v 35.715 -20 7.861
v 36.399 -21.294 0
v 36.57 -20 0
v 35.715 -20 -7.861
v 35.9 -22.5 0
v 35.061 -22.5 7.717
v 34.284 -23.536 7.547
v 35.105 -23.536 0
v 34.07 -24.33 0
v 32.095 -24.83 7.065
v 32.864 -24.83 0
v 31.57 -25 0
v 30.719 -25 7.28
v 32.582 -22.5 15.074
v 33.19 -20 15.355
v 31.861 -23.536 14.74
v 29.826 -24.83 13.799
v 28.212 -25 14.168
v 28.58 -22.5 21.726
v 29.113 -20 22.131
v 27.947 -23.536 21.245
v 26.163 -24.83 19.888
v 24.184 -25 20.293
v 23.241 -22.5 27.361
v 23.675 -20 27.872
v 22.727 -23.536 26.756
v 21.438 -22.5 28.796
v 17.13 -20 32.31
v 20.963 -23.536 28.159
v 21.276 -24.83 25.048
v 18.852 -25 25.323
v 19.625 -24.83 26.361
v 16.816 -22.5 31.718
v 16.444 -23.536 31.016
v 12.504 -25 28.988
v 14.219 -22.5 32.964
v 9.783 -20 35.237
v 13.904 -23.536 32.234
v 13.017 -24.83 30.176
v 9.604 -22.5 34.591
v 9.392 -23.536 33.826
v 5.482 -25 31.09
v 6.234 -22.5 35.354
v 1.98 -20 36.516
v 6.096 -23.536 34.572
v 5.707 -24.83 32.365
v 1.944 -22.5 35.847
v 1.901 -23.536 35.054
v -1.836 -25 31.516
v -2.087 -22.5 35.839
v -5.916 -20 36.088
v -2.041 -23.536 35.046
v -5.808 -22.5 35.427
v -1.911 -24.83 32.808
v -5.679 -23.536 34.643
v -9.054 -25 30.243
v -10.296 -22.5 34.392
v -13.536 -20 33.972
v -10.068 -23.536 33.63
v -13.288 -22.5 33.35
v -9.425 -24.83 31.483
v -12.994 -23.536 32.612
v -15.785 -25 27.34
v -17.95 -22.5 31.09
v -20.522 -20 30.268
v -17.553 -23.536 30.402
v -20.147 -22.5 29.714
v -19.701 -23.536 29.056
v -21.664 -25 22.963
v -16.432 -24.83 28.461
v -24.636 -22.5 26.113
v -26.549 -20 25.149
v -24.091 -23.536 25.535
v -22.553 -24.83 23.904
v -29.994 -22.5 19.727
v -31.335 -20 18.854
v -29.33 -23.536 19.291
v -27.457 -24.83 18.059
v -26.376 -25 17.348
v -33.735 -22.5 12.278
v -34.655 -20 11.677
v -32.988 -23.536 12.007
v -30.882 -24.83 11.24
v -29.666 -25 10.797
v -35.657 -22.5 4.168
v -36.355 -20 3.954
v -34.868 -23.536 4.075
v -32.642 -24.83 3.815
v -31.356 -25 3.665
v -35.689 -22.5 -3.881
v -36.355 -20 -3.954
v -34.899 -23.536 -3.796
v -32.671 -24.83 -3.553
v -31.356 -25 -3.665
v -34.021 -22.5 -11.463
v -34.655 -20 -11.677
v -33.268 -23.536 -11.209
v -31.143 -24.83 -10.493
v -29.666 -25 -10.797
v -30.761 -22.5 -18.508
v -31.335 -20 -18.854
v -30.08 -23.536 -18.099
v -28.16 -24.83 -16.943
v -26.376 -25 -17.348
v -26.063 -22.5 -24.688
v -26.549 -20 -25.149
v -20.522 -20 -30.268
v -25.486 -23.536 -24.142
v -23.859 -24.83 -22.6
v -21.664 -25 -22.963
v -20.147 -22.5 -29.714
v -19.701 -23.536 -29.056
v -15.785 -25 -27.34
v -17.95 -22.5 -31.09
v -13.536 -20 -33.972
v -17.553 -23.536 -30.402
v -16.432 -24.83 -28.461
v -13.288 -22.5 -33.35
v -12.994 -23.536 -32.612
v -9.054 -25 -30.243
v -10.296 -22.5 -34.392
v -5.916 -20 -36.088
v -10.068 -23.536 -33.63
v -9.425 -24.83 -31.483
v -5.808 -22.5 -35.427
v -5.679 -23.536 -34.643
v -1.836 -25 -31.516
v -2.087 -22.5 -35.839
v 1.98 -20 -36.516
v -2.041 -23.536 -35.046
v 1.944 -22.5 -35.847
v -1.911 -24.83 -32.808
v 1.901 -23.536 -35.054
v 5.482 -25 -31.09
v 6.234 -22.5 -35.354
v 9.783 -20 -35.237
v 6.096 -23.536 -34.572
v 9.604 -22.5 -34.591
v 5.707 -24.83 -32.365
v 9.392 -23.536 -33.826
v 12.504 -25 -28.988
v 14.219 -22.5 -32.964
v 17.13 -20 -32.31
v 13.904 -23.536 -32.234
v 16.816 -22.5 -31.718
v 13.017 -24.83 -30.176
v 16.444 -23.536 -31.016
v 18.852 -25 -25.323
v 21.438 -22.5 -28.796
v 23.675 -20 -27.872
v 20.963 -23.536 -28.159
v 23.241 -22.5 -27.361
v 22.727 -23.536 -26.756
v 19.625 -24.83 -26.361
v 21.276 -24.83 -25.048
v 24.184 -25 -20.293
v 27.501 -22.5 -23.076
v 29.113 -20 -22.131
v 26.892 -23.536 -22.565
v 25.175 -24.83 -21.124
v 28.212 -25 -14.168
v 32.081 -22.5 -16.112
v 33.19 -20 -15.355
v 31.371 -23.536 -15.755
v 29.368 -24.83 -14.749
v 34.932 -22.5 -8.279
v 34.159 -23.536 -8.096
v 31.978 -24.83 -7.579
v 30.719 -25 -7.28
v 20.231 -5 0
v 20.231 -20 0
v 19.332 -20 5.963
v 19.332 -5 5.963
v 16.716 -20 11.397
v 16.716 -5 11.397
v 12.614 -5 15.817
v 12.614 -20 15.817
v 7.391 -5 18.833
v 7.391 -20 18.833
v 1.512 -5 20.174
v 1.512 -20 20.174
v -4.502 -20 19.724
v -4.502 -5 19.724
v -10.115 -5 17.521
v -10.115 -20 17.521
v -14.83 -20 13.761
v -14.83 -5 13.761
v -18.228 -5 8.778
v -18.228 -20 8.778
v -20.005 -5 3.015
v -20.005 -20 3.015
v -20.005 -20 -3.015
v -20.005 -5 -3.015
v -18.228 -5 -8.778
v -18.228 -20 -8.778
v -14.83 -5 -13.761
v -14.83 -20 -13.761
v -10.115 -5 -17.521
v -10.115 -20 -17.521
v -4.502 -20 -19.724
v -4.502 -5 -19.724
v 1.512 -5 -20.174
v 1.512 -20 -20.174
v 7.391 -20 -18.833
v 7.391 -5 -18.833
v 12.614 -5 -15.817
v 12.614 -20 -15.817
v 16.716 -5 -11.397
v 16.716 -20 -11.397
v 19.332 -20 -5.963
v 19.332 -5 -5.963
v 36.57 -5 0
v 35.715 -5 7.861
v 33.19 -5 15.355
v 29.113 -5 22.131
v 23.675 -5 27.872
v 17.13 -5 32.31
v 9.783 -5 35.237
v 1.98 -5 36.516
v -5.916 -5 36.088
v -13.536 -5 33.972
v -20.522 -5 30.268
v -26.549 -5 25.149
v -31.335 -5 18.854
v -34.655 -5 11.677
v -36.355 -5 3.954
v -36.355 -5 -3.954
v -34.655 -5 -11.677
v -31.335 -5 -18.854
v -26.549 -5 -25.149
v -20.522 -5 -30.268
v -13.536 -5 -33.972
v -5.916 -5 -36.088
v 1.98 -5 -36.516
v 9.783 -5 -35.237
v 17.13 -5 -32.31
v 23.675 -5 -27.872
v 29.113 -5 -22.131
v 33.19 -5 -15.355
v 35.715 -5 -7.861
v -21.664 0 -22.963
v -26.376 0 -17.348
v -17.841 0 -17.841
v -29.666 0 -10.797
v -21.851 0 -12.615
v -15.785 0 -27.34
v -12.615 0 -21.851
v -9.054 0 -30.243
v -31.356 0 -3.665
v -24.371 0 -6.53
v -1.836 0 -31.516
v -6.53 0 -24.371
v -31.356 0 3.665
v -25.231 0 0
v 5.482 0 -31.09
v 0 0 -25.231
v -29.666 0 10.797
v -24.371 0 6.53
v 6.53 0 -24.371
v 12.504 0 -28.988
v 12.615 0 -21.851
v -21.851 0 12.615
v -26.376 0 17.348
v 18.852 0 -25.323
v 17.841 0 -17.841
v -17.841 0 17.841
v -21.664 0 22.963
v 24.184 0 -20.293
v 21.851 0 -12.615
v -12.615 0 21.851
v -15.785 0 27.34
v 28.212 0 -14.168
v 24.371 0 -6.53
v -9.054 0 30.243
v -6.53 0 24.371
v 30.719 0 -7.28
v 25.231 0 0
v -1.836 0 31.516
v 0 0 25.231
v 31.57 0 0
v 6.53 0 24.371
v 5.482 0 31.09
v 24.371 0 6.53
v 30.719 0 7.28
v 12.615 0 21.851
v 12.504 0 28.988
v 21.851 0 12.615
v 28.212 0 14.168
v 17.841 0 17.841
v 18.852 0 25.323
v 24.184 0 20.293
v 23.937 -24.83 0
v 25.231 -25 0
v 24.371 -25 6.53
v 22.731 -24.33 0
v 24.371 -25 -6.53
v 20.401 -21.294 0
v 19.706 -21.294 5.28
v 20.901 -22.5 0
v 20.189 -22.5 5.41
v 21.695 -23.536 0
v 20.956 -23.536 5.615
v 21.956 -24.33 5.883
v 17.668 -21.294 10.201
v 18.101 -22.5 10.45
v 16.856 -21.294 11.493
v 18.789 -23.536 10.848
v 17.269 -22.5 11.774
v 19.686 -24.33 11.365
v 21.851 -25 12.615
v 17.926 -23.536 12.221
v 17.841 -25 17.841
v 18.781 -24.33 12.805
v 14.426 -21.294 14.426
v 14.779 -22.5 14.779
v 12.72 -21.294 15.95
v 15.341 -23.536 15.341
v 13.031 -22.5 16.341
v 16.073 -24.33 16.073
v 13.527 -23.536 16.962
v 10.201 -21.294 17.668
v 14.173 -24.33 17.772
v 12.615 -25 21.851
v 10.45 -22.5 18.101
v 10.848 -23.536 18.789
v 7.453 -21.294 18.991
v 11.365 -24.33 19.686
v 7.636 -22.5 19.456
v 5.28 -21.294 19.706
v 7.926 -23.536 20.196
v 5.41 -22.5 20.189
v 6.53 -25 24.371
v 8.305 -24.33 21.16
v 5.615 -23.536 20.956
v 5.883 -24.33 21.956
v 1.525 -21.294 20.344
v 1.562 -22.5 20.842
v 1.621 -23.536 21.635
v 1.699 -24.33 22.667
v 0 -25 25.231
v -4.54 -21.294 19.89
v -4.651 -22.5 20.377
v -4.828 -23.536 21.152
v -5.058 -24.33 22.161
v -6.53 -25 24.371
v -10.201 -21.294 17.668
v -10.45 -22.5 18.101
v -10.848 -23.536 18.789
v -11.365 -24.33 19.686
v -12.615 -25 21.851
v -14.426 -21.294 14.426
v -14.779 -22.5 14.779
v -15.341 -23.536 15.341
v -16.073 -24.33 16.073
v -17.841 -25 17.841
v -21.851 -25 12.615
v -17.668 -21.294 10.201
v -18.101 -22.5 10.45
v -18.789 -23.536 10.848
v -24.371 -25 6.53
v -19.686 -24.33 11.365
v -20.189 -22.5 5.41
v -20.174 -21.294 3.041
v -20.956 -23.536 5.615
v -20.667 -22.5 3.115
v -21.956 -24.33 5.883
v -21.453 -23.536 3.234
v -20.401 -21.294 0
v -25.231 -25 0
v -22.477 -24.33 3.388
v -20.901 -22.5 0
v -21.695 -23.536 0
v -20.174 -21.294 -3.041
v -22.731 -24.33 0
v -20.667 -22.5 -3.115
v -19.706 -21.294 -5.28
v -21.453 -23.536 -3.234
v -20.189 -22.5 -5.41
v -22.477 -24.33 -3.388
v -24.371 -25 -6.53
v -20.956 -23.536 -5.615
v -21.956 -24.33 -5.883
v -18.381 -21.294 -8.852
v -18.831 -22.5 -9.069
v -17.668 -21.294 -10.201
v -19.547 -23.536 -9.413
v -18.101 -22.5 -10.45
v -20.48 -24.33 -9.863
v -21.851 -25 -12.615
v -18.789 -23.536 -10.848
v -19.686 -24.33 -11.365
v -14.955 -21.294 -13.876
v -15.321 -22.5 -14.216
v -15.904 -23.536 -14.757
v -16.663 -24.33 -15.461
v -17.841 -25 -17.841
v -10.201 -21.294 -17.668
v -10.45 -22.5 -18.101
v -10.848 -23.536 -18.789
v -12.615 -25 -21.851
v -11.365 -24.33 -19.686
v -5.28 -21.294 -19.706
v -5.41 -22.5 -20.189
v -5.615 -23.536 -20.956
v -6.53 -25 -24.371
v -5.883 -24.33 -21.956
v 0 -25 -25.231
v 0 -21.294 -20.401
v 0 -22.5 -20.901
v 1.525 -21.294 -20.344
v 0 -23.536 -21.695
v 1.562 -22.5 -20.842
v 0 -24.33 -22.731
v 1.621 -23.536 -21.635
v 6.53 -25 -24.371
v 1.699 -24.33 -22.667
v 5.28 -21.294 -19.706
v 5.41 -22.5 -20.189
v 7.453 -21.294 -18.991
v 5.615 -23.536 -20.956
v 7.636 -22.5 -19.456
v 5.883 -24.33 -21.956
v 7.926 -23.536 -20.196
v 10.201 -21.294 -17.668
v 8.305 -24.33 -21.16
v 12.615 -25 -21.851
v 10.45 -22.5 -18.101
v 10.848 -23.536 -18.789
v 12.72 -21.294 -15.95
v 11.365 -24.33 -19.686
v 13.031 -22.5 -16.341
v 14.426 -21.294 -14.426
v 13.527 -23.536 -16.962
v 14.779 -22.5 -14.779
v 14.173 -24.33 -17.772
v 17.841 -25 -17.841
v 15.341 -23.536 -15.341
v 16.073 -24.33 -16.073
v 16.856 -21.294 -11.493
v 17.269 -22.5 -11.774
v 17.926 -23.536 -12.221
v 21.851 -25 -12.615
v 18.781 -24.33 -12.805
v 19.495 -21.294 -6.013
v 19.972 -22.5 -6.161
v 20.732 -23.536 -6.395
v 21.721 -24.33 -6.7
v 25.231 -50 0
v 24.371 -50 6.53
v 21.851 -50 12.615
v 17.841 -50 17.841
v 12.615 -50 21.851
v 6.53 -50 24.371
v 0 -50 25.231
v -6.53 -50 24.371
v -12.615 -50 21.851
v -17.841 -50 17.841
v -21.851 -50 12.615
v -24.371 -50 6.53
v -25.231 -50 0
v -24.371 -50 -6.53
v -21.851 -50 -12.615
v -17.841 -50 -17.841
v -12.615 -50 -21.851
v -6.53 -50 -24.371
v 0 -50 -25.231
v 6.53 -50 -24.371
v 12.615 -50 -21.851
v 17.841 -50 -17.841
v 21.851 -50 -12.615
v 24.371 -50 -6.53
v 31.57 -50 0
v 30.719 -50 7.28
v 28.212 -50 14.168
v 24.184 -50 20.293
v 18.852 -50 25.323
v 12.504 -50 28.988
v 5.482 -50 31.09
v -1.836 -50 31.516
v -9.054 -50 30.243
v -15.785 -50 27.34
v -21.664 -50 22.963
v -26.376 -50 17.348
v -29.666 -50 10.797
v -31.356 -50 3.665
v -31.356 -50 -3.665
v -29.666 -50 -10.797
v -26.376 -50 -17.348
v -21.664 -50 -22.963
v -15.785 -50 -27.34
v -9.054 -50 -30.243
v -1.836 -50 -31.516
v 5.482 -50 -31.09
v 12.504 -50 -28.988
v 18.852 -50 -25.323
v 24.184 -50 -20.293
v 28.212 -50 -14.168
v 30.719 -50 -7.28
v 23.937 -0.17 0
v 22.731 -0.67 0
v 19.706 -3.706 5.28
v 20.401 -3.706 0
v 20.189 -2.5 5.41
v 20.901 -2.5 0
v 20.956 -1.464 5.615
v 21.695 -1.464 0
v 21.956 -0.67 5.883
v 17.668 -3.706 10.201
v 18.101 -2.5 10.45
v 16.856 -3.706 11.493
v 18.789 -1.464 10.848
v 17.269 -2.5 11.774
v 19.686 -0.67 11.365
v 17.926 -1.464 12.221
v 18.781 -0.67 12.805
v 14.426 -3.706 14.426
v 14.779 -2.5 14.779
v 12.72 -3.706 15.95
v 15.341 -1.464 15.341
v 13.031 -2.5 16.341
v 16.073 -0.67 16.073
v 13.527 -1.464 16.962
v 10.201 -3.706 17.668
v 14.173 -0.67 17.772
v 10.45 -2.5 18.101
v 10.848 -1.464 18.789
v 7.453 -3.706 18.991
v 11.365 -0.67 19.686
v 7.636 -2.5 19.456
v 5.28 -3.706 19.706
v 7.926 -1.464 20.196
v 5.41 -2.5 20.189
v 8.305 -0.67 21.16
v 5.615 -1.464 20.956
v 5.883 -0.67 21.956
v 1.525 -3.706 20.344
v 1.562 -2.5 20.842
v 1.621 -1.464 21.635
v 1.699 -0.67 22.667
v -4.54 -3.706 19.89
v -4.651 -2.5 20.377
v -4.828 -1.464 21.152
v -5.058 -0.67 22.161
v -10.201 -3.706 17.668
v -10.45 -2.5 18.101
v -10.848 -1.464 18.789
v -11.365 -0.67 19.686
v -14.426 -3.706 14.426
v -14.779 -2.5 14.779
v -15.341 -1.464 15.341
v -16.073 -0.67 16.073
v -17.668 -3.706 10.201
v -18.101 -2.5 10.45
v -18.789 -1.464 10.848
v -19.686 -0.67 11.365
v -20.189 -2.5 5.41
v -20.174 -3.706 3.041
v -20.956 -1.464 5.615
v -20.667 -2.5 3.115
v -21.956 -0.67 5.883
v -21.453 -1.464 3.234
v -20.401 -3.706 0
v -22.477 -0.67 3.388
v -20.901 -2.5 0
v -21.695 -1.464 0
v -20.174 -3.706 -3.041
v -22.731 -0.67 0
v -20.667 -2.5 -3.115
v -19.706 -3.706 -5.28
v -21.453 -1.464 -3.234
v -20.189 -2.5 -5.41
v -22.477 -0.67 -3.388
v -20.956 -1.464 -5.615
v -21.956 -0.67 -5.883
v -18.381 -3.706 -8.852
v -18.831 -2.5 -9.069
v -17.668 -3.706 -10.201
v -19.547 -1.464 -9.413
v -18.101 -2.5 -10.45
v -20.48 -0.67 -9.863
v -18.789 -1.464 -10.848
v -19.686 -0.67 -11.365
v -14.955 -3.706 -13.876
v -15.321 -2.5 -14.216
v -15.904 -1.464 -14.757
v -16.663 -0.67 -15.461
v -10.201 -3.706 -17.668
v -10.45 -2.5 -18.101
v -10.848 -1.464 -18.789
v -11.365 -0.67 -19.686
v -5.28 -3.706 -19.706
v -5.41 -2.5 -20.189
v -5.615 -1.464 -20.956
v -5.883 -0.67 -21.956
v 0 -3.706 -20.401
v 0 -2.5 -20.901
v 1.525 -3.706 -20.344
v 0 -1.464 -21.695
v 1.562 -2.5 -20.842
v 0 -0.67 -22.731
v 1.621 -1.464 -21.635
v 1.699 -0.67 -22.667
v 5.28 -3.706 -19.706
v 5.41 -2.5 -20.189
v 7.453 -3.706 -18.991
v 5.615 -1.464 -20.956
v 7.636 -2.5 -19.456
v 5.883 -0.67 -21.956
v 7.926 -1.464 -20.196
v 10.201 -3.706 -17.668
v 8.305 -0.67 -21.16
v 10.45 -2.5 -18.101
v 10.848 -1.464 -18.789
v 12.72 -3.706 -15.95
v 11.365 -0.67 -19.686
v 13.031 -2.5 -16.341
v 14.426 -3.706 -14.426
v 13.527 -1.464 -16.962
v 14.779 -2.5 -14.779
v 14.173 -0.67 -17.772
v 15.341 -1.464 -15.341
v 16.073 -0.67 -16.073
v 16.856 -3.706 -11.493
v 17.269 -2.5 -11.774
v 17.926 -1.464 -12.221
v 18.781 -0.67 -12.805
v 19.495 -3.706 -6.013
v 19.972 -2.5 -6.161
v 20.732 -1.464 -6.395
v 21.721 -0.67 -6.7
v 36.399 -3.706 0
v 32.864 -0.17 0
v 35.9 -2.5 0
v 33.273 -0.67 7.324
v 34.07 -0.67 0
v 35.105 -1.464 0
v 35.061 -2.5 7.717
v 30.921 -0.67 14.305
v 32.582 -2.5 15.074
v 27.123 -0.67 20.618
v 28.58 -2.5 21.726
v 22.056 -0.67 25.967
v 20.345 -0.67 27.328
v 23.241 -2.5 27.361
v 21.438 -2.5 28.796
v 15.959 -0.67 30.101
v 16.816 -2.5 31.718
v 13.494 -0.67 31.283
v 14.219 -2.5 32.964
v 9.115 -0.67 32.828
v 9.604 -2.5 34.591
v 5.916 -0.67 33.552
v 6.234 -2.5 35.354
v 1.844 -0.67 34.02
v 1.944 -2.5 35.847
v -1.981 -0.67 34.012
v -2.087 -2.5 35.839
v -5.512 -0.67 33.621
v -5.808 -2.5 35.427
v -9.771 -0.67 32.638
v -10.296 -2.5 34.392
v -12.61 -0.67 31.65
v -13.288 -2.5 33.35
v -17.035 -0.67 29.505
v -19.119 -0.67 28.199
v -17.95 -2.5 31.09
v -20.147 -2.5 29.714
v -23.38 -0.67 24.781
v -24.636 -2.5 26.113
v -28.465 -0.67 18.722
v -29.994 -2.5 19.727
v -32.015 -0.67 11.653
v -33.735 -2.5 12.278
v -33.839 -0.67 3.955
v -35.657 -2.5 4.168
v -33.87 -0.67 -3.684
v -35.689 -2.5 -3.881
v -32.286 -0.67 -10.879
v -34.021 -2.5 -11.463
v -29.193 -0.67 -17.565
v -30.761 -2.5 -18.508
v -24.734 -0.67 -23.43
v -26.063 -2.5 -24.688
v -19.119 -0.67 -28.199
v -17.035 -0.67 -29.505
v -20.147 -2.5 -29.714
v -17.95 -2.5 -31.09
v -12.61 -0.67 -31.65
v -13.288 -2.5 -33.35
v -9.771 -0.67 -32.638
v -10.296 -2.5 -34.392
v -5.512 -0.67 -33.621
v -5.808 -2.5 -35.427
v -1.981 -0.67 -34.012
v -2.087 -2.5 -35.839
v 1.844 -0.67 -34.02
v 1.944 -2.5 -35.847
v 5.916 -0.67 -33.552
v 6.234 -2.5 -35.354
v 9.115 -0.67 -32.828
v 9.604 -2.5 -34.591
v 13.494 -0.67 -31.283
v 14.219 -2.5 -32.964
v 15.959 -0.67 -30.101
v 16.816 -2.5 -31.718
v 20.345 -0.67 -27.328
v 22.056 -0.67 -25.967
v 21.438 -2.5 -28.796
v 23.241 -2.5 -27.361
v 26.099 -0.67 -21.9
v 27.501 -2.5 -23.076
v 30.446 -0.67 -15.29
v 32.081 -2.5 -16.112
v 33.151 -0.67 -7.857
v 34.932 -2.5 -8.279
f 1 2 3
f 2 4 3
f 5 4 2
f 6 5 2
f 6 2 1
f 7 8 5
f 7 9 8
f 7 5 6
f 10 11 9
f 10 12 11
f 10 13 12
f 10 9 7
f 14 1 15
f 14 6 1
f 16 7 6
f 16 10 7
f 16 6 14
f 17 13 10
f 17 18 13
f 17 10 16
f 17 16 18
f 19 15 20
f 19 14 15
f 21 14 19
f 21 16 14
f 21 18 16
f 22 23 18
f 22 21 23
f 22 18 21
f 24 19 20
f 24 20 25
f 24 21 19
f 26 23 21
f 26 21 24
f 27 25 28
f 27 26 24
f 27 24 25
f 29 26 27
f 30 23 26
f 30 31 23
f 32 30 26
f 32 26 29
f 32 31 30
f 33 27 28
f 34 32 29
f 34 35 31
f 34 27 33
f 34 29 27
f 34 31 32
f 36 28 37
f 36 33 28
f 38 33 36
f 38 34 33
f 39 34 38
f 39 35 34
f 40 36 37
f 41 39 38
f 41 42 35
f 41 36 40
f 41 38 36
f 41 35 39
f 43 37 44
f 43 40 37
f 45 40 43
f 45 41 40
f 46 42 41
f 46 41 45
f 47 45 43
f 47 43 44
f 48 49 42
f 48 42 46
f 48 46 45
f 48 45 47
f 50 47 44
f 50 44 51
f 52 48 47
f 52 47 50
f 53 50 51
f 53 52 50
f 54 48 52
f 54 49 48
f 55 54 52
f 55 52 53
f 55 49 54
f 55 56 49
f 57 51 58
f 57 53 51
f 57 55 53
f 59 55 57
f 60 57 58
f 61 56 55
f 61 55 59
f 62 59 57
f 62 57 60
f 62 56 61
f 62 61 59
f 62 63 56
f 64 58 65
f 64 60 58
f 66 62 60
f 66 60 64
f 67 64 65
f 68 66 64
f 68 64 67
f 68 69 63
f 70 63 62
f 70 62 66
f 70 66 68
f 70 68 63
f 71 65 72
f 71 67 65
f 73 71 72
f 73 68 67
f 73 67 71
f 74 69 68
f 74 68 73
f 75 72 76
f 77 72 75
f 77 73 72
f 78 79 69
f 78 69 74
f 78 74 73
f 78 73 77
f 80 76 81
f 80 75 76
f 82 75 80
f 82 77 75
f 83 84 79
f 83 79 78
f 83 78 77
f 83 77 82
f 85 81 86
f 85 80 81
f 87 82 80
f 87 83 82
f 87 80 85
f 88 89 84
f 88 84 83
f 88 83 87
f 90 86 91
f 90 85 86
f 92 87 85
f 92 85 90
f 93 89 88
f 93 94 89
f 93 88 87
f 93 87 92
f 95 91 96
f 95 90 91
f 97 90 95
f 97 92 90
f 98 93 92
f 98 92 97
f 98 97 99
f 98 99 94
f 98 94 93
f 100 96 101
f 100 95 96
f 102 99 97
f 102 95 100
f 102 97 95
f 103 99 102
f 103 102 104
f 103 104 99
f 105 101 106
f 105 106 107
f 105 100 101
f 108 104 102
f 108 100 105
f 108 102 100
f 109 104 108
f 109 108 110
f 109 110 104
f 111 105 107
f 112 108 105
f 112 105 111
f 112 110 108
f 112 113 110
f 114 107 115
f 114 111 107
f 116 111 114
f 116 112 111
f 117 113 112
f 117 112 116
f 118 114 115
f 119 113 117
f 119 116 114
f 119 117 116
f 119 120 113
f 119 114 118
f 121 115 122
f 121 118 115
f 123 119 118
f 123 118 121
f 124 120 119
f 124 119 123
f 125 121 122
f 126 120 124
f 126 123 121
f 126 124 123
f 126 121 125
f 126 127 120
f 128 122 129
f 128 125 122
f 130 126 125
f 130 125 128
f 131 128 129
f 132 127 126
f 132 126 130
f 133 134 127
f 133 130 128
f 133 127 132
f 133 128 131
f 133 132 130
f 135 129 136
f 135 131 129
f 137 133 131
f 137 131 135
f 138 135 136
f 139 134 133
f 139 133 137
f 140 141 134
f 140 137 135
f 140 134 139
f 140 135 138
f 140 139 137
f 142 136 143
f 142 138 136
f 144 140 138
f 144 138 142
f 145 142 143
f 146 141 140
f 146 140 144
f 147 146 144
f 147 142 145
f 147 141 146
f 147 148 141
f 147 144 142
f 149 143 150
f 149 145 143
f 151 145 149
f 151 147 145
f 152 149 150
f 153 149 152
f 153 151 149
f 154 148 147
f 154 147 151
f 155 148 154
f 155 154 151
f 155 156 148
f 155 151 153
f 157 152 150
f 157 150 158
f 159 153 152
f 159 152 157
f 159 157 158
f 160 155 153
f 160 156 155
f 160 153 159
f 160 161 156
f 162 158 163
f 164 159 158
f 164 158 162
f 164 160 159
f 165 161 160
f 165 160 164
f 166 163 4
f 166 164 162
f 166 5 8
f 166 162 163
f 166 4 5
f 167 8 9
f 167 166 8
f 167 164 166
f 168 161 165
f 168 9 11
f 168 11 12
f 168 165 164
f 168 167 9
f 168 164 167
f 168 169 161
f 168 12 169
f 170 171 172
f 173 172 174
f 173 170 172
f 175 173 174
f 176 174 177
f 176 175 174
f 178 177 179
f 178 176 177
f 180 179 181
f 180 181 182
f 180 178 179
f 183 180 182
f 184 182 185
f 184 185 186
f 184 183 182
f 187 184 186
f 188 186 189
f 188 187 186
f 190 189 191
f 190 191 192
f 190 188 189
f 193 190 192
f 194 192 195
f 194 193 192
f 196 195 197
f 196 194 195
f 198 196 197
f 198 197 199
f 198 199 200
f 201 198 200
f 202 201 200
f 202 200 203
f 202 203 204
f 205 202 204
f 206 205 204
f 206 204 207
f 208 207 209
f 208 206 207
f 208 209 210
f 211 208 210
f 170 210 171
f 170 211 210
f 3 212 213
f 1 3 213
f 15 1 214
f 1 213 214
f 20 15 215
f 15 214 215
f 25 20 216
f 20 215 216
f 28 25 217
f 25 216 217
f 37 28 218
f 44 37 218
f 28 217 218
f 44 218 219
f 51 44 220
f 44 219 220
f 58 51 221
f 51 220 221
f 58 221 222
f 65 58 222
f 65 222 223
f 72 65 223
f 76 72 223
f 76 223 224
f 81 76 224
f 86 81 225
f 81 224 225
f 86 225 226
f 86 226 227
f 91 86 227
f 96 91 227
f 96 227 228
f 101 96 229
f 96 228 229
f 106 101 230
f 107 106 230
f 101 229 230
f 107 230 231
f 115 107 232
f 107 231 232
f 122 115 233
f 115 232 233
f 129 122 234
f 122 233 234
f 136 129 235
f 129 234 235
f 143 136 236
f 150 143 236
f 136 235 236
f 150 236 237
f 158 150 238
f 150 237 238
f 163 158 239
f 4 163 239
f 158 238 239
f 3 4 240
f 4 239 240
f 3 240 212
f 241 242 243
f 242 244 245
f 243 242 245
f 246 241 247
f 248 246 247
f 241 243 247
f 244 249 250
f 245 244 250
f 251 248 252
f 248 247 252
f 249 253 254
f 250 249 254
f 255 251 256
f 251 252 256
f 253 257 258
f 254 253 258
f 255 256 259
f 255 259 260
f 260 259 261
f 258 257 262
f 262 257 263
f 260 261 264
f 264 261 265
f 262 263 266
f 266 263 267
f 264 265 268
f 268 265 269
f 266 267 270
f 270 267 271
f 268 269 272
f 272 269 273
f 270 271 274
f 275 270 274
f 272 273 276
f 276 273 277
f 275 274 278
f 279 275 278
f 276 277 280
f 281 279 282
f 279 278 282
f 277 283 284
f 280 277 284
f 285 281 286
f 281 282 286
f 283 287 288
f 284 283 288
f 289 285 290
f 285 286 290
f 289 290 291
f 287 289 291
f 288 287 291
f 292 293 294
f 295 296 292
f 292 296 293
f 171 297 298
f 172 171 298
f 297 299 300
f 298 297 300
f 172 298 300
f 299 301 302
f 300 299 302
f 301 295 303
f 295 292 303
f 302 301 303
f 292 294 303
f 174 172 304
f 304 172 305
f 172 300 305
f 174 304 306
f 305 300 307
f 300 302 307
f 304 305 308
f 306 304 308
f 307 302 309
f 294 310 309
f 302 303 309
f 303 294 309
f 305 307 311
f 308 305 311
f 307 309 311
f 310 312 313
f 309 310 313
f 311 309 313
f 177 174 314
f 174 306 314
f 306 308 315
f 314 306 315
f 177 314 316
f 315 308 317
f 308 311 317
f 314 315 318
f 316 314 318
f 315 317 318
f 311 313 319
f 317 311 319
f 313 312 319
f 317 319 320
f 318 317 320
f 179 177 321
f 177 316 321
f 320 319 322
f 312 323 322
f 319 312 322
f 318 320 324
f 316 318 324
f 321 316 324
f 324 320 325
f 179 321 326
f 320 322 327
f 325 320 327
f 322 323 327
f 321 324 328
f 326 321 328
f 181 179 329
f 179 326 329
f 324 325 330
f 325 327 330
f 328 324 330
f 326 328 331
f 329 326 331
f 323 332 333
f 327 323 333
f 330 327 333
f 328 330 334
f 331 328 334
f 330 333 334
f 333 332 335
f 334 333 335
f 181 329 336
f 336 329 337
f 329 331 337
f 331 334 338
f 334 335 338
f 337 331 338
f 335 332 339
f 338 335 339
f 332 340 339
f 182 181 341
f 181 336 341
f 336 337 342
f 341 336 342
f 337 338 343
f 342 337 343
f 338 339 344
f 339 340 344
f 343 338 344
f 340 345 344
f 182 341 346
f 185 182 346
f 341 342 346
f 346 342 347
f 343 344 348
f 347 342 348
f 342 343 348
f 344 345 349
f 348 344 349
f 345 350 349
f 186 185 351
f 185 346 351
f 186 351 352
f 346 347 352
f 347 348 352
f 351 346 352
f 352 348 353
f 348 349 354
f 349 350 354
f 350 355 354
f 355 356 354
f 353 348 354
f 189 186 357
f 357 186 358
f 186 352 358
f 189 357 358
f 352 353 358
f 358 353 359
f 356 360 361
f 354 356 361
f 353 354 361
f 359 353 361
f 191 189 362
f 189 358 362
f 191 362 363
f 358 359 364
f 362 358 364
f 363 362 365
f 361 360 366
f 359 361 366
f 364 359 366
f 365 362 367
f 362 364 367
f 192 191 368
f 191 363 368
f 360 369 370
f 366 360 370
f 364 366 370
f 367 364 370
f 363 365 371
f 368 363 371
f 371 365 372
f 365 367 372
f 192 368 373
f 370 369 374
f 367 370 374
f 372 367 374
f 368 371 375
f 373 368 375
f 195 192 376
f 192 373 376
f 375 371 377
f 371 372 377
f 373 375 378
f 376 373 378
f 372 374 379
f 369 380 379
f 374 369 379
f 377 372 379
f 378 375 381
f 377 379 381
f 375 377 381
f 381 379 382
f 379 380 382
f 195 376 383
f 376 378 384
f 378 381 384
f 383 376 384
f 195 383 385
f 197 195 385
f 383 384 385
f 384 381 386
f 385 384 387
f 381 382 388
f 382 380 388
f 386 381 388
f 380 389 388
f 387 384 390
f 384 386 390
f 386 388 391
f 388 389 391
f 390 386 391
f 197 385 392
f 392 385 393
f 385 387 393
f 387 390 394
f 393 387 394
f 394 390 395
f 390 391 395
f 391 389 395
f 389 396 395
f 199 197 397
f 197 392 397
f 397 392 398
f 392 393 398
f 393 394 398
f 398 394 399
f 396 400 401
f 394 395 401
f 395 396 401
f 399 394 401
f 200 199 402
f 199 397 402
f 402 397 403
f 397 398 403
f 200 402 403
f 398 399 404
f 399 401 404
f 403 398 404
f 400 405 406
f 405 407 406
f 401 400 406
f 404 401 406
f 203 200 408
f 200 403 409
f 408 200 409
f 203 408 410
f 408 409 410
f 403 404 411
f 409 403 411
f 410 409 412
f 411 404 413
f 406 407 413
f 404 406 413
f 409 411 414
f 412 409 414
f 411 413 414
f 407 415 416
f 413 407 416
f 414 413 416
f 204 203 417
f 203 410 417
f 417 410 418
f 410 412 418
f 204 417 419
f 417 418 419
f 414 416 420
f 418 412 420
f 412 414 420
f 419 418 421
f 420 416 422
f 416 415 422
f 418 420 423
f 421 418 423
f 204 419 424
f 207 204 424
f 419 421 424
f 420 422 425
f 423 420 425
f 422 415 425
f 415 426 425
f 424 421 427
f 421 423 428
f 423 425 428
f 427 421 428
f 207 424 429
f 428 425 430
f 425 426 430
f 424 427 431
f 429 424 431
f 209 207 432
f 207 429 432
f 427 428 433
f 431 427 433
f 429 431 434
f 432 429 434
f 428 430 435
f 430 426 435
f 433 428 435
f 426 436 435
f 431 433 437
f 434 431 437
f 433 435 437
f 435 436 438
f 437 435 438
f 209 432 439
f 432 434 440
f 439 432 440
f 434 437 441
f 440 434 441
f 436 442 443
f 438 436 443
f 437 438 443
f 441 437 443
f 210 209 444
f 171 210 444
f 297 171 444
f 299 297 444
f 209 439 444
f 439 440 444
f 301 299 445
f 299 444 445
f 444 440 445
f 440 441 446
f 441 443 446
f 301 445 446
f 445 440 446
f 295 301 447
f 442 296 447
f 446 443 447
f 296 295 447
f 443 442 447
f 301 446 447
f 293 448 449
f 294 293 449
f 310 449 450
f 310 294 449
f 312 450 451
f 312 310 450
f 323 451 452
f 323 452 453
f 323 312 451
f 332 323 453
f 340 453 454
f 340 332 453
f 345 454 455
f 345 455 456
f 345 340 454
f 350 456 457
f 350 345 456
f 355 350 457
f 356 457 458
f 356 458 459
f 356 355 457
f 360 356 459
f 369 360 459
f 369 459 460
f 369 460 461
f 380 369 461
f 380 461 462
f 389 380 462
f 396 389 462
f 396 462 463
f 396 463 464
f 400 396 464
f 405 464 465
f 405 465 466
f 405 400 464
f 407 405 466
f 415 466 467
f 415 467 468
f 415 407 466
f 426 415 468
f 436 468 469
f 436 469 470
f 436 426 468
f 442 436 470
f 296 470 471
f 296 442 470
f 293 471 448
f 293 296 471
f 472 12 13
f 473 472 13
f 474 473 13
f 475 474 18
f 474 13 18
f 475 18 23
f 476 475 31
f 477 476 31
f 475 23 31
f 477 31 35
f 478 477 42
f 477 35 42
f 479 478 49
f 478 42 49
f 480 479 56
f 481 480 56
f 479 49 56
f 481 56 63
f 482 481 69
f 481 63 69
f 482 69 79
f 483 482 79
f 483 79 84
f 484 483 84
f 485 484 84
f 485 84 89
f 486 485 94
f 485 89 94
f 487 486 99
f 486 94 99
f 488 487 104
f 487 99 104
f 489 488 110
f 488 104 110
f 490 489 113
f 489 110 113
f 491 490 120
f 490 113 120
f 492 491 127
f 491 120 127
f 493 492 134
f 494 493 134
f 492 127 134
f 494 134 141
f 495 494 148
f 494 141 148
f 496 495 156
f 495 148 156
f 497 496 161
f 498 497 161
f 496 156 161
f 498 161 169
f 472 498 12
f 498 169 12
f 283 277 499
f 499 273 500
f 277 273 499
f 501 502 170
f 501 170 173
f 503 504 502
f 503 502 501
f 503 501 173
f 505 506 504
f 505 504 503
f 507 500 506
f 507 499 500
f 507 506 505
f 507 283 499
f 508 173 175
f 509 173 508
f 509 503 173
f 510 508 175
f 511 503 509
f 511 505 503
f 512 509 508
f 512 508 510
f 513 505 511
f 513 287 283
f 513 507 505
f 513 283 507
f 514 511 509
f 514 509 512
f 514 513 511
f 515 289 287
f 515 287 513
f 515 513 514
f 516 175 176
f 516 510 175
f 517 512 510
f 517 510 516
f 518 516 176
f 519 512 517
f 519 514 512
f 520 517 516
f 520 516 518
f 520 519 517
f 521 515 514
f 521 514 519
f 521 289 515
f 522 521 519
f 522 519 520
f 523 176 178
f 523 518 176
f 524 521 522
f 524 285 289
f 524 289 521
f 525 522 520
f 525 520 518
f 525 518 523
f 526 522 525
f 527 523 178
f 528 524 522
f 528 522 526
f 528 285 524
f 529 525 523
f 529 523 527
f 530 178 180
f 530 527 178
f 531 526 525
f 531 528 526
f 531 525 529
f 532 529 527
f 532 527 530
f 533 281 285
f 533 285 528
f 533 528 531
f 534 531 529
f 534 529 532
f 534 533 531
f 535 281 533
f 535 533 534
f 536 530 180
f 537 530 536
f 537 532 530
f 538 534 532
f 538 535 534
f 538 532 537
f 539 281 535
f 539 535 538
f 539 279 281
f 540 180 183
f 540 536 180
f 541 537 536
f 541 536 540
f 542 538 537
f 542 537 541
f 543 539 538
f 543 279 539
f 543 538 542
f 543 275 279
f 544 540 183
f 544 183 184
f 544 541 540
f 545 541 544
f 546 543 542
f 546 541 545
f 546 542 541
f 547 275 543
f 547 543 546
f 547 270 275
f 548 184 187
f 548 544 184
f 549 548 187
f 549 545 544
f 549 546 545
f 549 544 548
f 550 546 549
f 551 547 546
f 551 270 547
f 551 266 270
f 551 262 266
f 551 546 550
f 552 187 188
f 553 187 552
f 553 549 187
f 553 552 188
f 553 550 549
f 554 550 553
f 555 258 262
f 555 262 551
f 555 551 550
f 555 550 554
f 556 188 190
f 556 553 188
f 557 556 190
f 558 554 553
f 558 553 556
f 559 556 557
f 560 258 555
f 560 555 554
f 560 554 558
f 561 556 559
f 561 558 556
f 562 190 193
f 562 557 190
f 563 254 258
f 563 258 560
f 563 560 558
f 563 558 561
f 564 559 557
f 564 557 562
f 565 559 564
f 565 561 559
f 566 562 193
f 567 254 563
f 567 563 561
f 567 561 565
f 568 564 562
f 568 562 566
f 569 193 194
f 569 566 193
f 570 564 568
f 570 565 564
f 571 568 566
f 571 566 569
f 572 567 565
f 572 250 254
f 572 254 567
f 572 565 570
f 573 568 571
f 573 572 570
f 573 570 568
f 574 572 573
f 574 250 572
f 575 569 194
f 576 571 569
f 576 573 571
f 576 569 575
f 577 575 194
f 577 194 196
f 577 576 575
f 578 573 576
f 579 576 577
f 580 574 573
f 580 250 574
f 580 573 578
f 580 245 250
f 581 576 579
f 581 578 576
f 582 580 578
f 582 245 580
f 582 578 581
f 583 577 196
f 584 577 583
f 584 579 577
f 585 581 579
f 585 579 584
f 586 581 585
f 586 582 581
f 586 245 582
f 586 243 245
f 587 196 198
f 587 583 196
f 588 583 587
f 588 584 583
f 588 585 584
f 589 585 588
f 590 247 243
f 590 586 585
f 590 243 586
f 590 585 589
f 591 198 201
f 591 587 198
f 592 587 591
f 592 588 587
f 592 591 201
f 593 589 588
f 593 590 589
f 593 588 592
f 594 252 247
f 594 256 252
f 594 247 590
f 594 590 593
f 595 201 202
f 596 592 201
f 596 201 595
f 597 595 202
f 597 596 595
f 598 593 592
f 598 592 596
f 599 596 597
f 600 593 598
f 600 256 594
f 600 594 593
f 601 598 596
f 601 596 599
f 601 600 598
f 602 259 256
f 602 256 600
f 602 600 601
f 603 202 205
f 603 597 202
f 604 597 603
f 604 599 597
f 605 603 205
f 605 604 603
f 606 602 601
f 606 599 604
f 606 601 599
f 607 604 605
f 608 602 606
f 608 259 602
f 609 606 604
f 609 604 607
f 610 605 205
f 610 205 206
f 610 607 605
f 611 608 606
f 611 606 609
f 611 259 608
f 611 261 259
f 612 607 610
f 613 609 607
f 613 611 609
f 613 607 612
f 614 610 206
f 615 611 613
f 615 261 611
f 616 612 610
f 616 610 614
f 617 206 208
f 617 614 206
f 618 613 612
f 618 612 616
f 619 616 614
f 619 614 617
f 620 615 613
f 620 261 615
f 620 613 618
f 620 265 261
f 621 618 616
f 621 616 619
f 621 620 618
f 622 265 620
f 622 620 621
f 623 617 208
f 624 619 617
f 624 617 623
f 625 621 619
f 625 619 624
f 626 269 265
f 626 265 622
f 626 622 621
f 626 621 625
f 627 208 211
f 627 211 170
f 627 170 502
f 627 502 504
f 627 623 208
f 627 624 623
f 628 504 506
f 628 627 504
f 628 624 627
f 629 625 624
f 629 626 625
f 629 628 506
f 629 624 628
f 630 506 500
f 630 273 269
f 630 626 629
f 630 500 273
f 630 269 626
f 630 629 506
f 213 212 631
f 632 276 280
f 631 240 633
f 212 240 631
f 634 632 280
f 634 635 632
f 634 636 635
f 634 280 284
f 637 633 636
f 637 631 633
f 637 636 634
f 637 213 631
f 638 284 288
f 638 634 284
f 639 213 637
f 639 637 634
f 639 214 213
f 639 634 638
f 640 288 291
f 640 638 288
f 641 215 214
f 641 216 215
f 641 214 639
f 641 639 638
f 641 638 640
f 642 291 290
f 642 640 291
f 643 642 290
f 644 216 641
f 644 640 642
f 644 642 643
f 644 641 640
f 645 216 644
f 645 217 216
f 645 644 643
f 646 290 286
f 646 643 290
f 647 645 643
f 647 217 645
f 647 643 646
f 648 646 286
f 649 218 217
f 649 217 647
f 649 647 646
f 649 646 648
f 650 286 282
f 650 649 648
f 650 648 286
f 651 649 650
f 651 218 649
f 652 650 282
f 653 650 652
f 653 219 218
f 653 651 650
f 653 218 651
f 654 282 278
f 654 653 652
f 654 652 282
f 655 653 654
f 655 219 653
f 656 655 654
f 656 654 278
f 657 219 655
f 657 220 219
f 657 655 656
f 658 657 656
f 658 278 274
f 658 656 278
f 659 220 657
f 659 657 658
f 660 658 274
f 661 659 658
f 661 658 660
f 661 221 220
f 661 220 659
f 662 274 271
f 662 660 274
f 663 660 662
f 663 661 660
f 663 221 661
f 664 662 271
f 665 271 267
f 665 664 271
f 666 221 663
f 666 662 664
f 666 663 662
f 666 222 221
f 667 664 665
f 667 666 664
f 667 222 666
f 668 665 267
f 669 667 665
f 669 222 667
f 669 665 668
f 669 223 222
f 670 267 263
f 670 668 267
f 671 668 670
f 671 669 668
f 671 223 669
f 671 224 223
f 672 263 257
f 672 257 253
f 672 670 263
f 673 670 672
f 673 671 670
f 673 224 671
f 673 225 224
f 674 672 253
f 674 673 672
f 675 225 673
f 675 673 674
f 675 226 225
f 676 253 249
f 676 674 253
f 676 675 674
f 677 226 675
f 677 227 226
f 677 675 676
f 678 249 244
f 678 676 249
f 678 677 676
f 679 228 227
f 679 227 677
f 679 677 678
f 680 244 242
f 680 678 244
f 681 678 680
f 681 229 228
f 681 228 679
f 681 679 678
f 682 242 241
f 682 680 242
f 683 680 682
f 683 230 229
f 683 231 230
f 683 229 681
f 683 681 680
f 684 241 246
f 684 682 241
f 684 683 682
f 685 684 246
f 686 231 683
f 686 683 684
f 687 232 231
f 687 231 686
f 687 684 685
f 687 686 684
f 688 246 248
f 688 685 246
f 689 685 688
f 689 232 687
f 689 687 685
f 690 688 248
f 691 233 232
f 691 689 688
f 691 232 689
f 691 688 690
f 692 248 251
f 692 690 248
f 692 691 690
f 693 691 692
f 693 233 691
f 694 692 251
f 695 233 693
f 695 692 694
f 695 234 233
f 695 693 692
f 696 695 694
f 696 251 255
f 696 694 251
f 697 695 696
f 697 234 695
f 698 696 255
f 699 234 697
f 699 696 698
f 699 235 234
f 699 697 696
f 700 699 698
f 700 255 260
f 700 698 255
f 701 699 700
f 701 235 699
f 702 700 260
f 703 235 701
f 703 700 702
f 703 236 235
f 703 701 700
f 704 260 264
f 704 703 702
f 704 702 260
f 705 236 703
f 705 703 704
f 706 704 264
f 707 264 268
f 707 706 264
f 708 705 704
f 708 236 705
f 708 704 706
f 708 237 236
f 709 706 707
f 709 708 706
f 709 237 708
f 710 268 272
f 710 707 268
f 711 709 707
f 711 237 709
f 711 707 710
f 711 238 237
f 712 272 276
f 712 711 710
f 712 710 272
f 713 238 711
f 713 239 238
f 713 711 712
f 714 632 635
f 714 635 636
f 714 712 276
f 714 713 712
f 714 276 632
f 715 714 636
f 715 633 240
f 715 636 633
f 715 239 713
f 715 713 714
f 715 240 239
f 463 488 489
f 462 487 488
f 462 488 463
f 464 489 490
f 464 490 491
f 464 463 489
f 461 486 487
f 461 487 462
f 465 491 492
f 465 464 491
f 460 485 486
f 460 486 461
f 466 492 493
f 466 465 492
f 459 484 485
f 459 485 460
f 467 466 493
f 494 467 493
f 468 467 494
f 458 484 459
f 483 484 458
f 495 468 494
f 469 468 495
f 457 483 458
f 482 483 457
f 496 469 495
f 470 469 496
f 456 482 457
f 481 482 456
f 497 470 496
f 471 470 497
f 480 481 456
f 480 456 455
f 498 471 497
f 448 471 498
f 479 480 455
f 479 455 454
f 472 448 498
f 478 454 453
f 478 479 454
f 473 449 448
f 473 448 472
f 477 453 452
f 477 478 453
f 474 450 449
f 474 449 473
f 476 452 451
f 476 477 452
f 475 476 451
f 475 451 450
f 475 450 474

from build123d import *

# Parameters (mm, degrees)
F0_R     = 36.5696932785
F0_R_2   = 20.2309994717
F1_DEPTH = 25
F2_R     = 5
F3_R     = 5
F4_R     = 5
F5_R     = 5
F6_DEPTH = 25


with BuildPart() as f1:
    # F0 (on Front) → F1 (new body)
    with BuildSketch(Plane.XZ):
        Circle(F0_R)
        Circle(F0_R_2, mode=Mode.SUBTRACT)
    extrude(amount=F1_DEPTH)

    # F2
    f2_edges = [f1.edges().sort_by_distance(p)[0] for p in [
        (-20.230999, -25, 0),
    ]]
    fillet(f2_edges, radius=F2_R)

    # F3
    f3_edges = [f1.edges().sort_by_distance(p)[0] for p in [
        (-20.230999, 0, 0),
    ]]
    fillet(f3_edges, radius=F3_R)

    # F4
    f4_edges = [f1.edges().sort_by_distance(p)[0] for p in [
        (-36.569693, 0, 0),
    ]]
    fillet(f4_edges, radius=F4_R)

    # F5
    f5_edges = [f1.edges().sort_by_distance(p)[0] for p in [
        (-36.569693, -25, 0),
    ]]
    fillet(f5_edges, radius=F5_R)

    # F6 (add): a face of the model
    f6_faces = [f1.faces().sort_by_distance(p)[0] for p in [
        (-30.6767675107, -25, 0),
    ]]
    extrude(f6_faces, amount=F6_DEPTH)


solid = f1.part
